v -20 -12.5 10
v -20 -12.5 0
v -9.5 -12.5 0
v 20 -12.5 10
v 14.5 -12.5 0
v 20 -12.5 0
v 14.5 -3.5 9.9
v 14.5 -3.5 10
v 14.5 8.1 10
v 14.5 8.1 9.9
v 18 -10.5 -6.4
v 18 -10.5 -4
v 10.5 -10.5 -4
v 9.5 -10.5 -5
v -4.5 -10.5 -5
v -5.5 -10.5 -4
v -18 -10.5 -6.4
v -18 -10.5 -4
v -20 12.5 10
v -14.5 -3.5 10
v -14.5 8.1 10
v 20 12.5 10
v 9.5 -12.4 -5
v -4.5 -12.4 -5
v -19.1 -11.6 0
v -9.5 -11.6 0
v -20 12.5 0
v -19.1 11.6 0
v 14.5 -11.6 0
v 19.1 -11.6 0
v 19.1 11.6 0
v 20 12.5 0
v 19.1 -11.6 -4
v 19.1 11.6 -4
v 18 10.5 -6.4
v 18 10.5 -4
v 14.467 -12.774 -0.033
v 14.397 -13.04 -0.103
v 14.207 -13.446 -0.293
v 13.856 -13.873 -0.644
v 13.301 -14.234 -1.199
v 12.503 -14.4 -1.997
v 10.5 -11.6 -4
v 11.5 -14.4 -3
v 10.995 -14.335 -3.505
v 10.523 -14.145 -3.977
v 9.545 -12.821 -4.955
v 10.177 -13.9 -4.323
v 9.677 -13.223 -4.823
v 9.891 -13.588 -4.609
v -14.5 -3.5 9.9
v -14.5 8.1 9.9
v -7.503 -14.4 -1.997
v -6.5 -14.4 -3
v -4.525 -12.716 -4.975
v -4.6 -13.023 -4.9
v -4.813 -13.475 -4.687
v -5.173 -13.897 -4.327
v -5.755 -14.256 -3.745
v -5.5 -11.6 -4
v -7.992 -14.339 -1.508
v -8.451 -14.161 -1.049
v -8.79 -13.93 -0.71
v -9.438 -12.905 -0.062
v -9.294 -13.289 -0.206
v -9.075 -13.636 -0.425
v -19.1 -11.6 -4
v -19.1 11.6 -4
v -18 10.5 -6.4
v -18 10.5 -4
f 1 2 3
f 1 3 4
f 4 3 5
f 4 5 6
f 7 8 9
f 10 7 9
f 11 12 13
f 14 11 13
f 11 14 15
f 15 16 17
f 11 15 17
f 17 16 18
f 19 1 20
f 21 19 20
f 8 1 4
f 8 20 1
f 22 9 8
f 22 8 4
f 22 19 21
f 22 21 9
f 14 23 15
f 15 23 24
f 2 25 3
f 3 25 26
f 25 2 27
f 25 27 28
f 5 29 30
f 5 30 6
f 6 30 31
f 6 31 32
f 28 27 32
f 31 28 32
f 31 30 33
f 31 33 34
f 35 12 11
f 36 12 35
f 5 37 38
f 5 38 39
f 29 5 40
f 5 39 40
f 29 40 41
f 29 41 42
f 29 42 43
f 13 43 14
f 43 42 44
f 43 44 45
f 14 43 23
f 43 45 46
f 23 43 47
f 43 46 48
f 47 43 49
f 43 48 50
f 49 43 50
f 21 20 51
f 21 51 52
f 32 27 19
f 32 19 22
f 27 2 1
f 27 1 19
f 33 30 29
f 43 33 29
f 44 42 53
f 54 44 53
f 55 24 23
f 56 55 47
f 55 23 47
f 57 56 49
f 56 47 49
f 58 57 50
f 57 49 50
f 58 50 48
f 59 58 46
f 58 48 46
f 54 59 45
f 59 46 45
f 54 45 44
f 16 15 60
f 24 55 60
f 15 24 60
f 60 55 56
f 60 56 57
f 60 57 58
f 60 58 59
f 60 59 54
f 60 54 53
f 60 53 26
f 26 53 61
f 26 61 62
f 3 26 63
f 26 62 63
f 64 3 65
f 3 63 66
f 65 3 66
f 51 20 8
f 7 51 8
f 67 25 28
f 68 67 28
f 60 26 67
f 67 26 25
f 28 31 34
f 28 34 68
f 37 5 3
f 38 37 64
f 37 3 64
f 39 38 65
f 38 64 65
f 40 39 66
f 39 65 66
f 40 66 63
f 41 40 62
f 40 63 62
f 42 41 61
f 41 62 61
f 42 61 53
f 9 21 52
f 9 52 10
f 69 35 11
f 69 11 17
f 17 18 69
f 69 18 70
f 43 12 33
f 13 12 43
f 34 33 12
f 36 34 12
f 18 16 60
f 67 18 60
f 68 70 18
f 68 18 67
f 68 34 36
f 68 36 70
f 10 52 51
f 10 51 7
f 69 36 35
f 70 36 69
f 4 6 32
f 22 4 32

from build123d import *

# Parameters (mm, degrees)
SKETCH1_W                       = 40
SKETCH1_H                       = 25
BOSS_EXTRUDE1_DEPTH             = 10
SKETCH2_W                       = 29
SKETCH2_H                       = 11.6
CUT_EXTRUDE1_DEPTH              = 0.1
SKETCH4_W                       = 38.2
SKETCH4_H                       = 23.2
BOSS_EXTRUDE2_DEPTH             = 4
SKETCH5_W                       = 36
SKETCH5_H                       = 21
BOSS_EXTRUDE3_DEPTH             = 2.4
BOSS_EXTRUDE5_DEPTH             = 2.8
BOSS_EXTRUDE5_DIRECTION_2_REACH = 34.876
FILLET1_R                       = 2


with BuildPart() as part:
    # Sketch1 → Boss-Extrude1 (new body)
    with BuildSketch(Plane.XY):
        Rectangle(SKETCH1_W, SKETCH1_H)
    extrude(amount=BOSS_EXTRUDE1_DEPTH)

    # Sketch2 → Cut-Extrude1 (cut)
    with BuildSketch(Plane.XY.offset(10)):
        with Locations((0, 2.3)):
            Rectangle(SKETCH2_W, SKETCH2_H)
    extrude(amount=-CUT_EXTRUDE1_DEPTH, mode=Mode.SUBTRACT)

    # Sketch4 → Boss-Extrude2 (add)
    with BuildSketch(Plane(origin=(0, 0, 0), x_dir=(-1, 0, 0), z_dir=(0, 0, -1))):
        Rectangle(SKETCH4_W, SKETCH4_H)
    extrude(amount=BOSS_EXTRUDE2_DEPTH)

    # Sketch5 → Boss-Extrude3 (add)
    with BuildSketch(Plane(origin=(0, 0, -4), x_dir=(-1, 0, 0), z_dir=(0, 0, -1))):
        Rectangle(SKETCH5_W, SKETCH5_H)
    extrude(amount=BOSS_EXTRUDE3_DEPTH)

    # Sketch7 → Boss-Extrude5 (add)
    with BuildSketch(Plane.XZ.offset(11.6)):
        Polygon((14.5, 0), (9.5, -5), (-4.5, -5), (-9.5, 0), align=None)
    extrude(amount=BOSS_EXTRUDE5_DEPTH)

    # Boss-Extrude5 direction 2: up to this face of the body (flat: up to its plane)
    boss_extrude5_direction_2_end = Plane(part.part.faces().sort_by_distance((0, -10.5, -5.2))[0])
    # Sketch7 → Boss-Extrude5 direction 2 (add, up to the picked face)
    with BuildSketch(Plane.XZ.offset(11.6), mode=Mode.PRIVATE) as boss_extrude5_direction_2_sk1:
        Polygon((14.5, 0), (9.5, -5), (-4.5, -5), (-9.5, 0), align=None)
    boss_extrude5_direction_2_tool1 = split(extrude(boss_extrude5_direction_2_sk1.sketch, amount=-BOSS_EXTRUDE5_DIRECTION_2_REACH, mode=Mode.PRIVATE), bisect_by=boss_extrude5_direction_2_end, keep=Keep.BOTH, mode=Mode.PRIVATE)
    add(boss_extrude5_direction_2_tool1.solids().sort_by(Axis((2.5, -11.6, -2.280702), (0, 1, 0)))[0])

    # Fillet1
    # the kernel refuses this fillet: 2 mm, written as the material it takes off along each edge
    with BuildSketch(Plane(origin=(-14.493746089, -14.4, 0), x_dir=(0, 1, 0), z_dir=(1, 0, 0))) as fillet1_piece_1:
        with BuildLine():
            CenterArc((2, -1.997498436), FILLET1_R, 92.865983983, 87.134016017)
            Line((0, -1.997498436), (-0.04, -1.997498436))
            Line((-0.04, -1.997498436), (-0.04, 0))
            Line((-0.04, 0), (0, 0.04))
            ThreePointArc((0, 0.04), (0.95, 0.04), (1.898, 0.039949969))
            Line((1.898, 0.039949969), (1.9, 0))
        make_face()
    extrude(amount=33.987492178, mode=Mode.SUBTRACT)
    with BuildSketch(Plane(origin=(14.5, -14.4, -5), x_dir=(0, 1, 0), z_dir=(-1, 0, 0))) as fillet1_piece_2:
        with BuildLine():
            CenterArc((FILLET1_R, -FILLET1_R), FILLET1_R, 90, 90)
            Line((0, -FILLET1_R), (-FILLET1_R * 0.02, -FILLET1_R))
            Line((-FILLET1_R * 0.02, -FILLET1_R), (-FILLET1_R * 0.02, FILLET1_R * 0.02))
            Line((-FILLET1_R * 0.02, FILLET1_R * 0.02), (FILLET1_R, FILLET1_R * 0.02))
            Line((FILLET1_R, FILLET1_R * 0.02), (FILLET1_R, 0))
        make_face()
    extrude(amount=24, mode=Mode.SUBTRACT)


solid = part.part
